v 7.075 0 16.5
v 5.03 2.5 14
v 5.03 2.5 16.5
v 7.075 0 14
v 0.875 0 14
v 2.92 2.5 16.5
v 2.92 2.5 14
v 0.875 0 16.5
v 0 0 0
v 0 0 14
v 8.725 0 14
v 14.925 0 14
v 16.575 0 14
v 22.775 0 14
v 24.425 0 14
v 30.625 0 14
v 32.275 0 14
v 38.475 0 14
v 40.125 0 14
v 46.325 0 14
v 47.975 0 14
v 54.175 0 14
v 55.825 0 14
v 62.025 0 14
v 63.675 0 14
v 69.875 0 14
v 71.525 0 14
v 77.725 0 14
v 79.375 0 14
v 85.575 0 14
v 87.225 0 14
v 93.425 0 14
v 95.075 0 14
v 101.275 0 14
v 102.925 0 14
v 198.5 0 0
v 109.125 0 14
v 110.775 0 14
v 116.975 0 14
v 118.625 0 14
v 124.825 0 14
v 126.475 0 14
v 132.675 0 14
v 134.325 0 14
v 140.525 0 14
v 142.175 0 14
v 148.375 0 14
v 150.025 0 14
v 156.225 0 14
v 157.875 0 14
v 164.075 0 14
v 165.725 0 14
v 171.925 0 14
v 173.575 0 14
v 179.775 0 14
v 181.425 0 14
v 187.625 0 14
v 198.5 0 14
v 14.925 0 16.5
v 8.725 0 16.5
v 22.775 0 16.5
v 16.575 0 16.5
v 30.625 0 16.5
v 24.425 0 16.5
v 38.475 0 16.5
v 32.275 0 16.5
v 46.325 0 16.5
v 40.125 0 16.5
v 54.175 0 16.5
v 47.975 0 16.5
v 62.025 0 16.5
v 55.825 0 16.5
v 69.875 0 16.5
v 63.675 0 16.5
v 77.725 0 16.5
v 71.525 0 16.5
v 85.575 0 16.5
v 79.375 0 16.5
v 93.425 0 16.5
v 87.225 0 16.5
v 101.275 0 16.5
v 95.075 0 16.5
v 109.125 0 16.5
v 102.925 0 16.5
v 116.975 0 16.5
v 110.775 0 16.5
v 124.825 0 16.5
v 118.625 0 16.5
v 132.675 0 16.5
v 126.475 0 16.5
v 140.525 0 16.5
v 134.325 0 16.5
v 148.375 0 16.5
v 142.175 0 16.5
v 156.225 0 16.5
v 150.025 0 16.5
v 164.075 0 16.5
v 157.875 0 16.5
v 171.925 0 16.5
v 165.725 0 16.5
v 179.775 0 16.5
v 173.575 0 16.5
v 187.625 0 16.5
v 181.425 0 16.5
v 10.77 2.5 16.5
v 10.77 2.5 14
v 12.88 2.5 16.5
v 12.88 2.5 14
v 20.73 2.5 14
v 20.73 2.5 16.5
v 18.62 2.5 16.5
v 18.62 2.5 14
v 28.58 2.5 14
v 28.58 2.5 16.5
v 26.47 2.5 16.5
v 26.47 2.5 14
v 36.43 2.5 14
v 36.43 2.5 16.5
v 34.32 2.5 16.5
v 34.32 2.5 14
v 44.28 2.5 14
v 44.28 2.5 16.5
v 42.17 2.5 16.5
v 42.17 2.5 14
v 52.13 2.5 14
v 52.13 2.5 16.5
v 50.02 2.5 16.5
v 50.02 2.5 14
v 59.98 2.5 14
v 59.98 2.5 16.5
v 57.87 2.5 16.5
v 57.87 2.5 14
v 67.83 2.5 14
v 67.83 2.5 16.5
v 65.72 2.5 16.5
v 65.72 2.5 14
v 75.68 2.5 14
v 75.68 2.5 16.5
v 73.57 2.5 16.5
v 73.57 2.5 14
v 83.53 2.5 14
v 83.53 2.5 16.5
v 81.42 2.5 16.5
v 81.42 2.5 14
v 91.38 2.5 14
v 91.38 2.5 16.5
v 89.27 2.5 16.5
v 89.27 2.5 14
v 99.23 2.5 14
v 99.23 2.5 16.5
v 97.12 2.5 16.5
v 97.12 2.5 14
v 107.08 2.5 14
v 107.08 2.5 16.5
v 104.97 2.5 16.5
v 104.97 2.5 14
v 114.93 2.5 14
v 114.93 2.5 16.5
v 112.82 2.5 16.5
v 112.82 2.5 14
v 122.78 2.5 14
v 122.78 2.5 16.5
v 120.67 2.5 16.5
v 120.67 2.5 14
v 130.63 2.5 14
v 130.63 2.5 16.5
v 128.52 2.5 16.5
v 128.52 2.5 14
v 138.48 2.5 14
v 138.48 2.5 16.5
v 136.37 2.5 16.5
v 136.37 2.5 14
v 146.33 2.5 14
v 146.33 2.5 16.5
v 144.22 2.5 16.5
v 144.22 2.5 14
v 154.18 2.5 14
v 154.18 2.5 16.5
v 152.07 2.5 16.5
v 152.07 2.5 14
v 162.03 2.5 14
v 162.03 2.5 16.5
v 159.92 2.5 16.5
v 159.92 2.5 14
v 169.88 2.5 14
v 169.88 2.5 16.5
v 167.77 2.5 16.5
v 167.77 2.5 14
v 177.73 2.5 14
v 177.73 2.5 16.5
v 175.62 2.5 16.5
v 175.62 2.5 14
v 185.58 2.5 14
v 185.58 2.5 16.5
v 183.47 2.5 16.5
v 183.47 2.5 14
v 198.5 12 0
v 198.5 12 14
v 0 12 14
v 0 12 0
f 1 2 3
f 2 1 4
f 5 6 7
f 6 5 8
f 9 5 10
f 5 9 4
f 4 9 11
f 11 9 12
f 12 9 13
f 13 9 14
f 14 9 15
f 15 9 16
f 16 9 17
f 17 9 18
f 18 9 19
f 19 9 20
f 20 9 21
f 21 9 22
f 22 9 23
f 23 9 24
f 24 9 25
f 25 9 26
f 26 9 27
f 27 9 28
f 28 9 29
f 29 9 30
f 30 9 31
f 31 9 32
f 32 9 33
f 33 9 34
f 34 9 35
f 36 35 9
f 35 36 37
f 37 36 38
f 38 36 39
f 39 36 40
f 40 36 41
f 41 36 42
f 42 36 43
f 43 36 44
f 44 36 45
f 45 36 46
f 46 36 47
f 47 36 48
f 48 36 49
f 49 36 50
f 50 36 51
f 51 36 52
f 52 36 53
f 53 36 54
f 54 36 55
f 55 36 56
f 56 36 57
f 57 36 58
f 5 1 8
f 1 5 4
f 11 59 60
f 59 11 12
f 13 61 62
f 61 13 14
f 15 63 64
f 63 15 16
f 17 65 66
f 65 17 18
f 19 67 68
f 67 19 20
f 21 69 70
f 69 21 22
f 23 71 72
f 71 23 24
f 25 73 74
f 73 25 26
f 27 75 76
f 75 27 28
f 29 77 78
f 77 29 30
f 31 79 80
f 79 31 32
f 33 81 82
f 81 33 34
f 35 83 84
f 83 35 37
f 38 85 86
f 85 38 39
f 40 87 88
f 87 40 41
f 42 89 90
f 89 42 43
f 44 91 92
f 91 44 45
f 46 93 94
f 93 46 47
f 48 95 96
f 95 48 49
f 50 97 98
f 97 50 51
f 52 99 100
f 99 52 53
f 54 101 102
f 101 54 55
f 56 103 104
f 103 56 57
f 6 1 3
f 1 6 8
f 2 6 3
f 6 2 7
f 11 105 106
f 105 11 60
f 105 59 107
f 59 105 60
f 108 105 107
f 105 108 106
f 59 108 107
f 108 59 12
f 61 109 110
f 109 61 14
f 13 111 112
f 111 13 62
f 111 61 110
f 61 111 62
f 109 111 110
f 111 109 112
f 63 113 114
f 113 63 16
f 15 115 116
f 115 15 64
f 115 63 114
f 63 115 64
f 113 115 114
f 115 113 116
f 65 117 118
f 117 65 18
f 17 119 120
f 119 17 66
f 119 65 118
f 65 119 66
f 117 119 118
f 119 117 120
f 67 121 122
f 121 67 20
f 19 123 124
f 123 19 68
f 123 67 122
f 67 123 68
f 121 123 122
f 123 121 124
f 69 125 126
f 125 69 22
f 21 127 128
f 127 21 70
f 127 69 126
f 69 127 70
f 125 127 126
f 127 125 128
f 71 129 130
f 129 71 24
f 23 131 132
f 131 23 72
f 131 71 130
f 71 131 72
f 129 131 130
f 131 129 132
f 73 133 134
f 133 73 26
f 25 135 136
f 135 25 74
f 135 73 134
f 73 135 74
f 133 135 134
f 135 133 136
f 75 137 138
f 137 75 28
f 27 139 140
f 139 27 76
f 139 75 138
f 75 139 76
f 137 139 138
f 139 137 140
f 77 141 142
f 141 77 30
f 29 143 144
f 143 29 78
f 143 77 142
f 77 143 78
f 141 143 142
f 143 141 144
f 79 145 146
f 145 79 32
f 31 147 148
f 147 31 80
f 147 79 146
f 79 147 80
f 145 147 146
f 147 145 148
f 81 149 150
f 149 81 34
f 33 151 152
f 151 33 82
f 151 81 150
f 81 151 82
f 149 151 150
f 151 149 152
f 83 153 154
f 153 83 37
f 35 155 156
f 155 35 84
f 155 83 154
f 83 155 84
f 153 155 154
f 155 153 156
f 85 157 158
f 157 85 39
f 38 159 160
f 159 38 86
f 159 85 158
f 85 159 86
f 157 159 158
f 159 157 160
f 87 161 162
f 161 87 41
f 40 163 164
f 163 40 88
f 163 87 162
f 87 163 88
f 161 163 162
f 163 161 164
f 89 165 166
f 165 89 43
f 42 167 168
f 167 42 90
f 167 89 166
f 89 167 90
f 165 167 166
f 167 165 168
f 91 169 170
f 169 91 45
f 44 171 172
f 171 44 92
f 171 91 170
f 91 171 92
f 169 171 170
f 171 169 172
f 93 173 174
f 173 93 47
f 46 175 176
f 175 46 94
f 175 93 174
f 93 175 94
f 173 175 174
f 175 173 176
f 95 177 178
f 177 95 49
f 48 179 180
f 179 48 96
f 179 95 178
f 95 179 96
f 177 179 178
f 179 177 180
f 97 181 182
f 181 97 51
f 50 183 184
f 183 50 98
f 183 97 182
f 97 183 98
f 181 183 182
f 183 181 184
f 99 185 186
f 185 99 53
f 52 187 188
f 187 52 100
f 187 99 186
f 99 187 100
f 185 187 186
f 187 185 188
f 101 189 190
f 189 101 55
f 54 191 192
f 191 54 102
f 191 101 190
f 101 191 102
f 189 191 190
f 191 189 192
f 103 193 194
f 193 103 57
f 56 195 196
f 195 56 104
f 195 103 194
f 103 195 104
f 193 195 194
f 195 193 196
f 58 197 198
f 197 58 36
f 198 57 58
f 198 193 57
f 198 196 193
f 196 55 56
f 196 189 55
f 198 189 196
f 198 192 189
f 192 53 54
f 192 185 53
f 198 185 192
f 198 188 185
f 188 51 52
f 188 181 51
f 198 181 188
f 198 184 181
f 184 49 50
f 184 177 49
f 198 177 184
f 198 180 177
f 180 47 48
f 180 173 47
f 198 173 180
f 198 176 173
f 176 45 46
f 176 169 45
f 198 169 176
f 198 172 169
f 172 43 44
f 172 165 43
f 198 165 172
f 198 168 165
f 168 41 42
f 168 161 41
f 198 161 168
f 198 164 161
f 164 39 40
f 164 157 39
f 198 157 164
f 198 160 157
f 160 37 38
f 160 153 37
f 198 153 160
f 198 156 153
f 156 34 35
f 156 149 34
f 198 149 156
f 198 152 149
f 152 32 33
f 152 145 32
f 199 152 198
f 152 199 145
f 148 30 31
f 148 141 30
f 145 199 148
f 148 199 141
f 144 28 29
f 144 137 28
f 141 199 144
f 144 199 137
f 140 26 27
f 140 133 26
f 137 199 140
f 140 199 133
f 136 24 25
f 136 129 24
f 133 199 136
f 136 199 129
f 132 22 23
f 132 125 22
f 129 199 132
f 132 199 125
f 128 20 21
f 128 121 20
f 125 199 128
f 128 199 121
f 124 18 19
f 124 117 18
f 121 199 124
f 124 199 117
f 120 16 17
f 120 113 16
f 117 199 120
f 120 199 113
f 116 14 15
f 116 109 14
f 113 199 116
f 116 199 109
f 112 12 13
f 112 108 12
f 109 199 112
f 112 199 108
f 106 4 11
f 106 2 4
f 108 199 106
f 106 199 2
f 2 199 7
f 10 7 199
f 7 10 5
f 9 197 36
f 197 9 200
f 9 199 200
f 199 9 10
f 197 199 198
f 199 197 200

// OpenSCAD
$fn = 32;

// ----------------------------------------------------------------------
// Gear rack: m=2.5 z=24, 198.5 x 12 x 16.5 mm
// ----------------------------------------------------------------------

// --- parameters (mm) ---
bar_len = 198.5;          // rack length, X
bar_w = 12;               // rack width, Y
bar_h = 16.5;             // overall height, Z
gear_module = 2.5;        // module
base_t = 14;              // tooth root line height
pitch = 7.85;             // circular pitch
tip_w = 2.11;             // tooth thickness at the tip
root_w = 6.2;             // tooth thickness at the root line
sink = 0.6;               // tooth root overlap into the body

tooth_span = 188.5;

module tooth(x0) {
  /* 20 deg flank profile, sunk into the body for a positive overlap */
  translate([x0, 0, base_t - sink])
    linear_extrude(height = bar_h - base_t + sink)
      polygon(points = [[-root_w / 2, 0], [root_w / 2, 0],
                        [tip_w / 2, bar_h - base_t],
                        [-tip_w / 2, bar_h - base_t]]);
}

difference() {
  union() {
    cube([bar_len, bar_w, base_t]);
    for (i = [0 : 24 - 1])
      tooth((i + 0.5) * pitch + (tooth_span - 24 * pitch) / 2);
  }
}
